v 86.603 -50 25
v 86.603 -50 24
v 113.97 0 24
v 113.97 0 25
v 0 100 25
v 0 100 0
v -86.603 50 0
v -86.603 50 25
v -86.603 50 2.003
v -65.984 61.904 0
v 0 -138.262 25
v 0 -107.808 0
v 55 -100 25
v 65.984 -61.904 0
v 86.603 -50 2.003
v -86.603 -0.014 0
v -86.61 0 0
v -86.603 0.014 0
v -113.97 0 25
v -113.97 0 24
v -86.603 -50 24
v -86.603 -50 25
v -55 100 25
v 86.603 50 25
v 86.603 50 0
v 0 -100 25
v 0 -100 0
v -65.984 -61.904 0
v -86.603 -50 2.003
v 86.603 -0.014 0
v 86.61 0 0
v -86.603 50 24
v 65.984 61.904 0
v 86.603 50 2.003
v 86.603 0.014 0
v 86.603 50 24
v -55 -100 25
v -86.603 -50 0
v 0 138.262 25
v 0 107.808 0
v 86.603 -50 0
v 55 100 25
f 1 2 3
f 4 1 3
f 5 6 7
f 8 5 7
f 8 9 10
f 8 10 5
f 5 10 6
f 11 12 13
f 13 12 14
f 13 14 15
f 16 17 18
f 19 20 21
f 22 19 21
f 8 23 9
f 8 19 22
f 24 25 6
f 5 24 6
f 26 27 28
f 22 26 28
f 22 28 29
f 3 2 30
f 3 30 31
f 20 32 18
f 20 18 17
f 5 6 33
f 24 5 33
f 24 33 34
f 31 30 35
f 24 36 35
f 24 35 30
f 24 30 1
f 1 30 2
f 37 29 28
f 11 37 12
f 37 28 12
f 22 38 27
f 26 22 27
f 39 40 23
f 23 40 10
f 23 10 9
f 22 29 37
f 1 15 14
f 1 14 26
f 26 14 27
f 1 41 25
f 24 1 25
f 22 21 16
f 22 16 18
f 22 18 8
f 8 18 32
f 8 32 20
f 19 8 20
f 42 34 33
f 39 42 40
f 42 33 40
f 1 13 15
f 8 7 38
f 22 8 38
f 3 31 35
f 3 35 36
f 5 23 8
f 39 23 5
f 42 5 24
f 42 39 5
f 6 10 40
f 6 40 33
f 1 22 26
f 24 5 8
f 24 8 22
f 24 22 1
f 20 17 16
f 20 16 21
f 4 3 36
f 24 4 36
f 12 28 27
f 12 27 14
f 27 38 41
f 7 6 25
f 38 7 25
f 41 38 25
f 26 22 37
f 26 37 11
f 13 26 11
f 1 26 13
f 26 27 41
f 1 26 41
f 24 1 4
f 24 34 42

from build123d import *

# Parameters (mm, degrees)
F2_DEPTH  = 25
F3_SIZE   = 24.99999
F3_2_SIZE = 24.99999
F4_SIZE   = 24
F4_2_SIZE = 24


# Not quite as in the source:
# - a fillet or chamfer is up to 0.001 mm smaller than in the source, because OpenCascade refuses the exact size
# - a feature names something its author has since deleted; it is built from what else it names


with BuildPart() as f2:
    # F1 (on face) → F2 (new body)
    with BuildSketch(Plane.XY):
        Polygon((-86.6025403784, -50), (0, -100), (86.6025403784, -50), (86.6025403784, 50), (0, 100), (-86.6025403784, 50), align=None)
    extrude(amount=F2_DEPTH)


with BuildPart() as f2b:
    # F0 (on Top) → F2, piece 2 (new body)
    with BuildSketch(Plane.XY):
        Polygon((0, 100), (86.6025403784, 50), (55, 100), align=None)
        Polygon((-86.6025403784, 50), (0, 100), (-55, 100), align=None)
        Polygon((-55, 100), (0, 100), (55, 100), (0, 138.2622529394), align=None)
    extrude(amount=F2_DEPTH)

    # F3 (size 25 in the source; OpenCascade refuses exactly that, so slightly less here)
    f3_edges = [f2b.edges().sort_by_distance(p)[0] for p in [
        (-27.5, 119.131126, 0),
        (27.5, 119.131126, 0),
    ]]
    chamfer(f3_edges, length=F3_SIZE)


with BuildPart() as f2c:
    # F0 (on Top) → F2, piece 3 (new body)
    with BuildSketch(Plane.XY):
        Polygon((-113.9704047453, 0), (-86.6025403784, -50), (-86.6025403784, 50), align=None)
    extrude(amount=F2_DEPTH)

    # F4
    f4_edges = [f2c.edges().sort_by_distance(p)[0] for p in [
        (-100.286473, 25, 0),
        (-100.286473, -25, 0),
    ]]
    chamfer(f4_edges, length=F4_SIZE)


with BuildPart() as f2d:
    # F0 (on Top) → F2, piece 4 (new body)
    with BuildSketch(Plane.XY):
        Polygon((-55, -100), (0, -100), (-86.6025403784, -50), align=None)
        Polygon((55, -100), (86.6025403784, -50), (0, -100), align=None)
        Polygon((55, -100), (0, -100), (-55, -100), (0, -138.2622529394), align=None)
    extrude(amount=F2_DEPTH)

    # F3#2 (size 25 in the source; OpenCascade refuses exactly that, so slightly less here)
    f3_2_edges = [f2d.edges().sort_by_distance(p)[0] for p in [
        (-27.5, -119.131126, 0),
        (27.5, -119.131126, 0),
    ]]
    chamfer(f3_2_edges, length=F3_2_SIZE)


with BuildPart() as f2e:
    # F0 (on Top) → F2, piece 5 (new body)
    with BuildSketch(Plane.XY):
        Polygon((86.6025403784, 50), (86.6025403784, -50), (113.9704047453, 0), align=None)
    extrude(amount=F2_DEPTH)

    # F4#2
    f4_2_edges = [f2e.edges().sort_by_distance(p)[0] for p in [
        (100.286473, -25, 0),
        (100.286473, 25, 0),
    ]]
    chamfer(f4_2_edges, length=F4_2_SIZE)


solid = Compound([f2.part, f2b.part, f2c.part, f2d.part, f2e.part])
